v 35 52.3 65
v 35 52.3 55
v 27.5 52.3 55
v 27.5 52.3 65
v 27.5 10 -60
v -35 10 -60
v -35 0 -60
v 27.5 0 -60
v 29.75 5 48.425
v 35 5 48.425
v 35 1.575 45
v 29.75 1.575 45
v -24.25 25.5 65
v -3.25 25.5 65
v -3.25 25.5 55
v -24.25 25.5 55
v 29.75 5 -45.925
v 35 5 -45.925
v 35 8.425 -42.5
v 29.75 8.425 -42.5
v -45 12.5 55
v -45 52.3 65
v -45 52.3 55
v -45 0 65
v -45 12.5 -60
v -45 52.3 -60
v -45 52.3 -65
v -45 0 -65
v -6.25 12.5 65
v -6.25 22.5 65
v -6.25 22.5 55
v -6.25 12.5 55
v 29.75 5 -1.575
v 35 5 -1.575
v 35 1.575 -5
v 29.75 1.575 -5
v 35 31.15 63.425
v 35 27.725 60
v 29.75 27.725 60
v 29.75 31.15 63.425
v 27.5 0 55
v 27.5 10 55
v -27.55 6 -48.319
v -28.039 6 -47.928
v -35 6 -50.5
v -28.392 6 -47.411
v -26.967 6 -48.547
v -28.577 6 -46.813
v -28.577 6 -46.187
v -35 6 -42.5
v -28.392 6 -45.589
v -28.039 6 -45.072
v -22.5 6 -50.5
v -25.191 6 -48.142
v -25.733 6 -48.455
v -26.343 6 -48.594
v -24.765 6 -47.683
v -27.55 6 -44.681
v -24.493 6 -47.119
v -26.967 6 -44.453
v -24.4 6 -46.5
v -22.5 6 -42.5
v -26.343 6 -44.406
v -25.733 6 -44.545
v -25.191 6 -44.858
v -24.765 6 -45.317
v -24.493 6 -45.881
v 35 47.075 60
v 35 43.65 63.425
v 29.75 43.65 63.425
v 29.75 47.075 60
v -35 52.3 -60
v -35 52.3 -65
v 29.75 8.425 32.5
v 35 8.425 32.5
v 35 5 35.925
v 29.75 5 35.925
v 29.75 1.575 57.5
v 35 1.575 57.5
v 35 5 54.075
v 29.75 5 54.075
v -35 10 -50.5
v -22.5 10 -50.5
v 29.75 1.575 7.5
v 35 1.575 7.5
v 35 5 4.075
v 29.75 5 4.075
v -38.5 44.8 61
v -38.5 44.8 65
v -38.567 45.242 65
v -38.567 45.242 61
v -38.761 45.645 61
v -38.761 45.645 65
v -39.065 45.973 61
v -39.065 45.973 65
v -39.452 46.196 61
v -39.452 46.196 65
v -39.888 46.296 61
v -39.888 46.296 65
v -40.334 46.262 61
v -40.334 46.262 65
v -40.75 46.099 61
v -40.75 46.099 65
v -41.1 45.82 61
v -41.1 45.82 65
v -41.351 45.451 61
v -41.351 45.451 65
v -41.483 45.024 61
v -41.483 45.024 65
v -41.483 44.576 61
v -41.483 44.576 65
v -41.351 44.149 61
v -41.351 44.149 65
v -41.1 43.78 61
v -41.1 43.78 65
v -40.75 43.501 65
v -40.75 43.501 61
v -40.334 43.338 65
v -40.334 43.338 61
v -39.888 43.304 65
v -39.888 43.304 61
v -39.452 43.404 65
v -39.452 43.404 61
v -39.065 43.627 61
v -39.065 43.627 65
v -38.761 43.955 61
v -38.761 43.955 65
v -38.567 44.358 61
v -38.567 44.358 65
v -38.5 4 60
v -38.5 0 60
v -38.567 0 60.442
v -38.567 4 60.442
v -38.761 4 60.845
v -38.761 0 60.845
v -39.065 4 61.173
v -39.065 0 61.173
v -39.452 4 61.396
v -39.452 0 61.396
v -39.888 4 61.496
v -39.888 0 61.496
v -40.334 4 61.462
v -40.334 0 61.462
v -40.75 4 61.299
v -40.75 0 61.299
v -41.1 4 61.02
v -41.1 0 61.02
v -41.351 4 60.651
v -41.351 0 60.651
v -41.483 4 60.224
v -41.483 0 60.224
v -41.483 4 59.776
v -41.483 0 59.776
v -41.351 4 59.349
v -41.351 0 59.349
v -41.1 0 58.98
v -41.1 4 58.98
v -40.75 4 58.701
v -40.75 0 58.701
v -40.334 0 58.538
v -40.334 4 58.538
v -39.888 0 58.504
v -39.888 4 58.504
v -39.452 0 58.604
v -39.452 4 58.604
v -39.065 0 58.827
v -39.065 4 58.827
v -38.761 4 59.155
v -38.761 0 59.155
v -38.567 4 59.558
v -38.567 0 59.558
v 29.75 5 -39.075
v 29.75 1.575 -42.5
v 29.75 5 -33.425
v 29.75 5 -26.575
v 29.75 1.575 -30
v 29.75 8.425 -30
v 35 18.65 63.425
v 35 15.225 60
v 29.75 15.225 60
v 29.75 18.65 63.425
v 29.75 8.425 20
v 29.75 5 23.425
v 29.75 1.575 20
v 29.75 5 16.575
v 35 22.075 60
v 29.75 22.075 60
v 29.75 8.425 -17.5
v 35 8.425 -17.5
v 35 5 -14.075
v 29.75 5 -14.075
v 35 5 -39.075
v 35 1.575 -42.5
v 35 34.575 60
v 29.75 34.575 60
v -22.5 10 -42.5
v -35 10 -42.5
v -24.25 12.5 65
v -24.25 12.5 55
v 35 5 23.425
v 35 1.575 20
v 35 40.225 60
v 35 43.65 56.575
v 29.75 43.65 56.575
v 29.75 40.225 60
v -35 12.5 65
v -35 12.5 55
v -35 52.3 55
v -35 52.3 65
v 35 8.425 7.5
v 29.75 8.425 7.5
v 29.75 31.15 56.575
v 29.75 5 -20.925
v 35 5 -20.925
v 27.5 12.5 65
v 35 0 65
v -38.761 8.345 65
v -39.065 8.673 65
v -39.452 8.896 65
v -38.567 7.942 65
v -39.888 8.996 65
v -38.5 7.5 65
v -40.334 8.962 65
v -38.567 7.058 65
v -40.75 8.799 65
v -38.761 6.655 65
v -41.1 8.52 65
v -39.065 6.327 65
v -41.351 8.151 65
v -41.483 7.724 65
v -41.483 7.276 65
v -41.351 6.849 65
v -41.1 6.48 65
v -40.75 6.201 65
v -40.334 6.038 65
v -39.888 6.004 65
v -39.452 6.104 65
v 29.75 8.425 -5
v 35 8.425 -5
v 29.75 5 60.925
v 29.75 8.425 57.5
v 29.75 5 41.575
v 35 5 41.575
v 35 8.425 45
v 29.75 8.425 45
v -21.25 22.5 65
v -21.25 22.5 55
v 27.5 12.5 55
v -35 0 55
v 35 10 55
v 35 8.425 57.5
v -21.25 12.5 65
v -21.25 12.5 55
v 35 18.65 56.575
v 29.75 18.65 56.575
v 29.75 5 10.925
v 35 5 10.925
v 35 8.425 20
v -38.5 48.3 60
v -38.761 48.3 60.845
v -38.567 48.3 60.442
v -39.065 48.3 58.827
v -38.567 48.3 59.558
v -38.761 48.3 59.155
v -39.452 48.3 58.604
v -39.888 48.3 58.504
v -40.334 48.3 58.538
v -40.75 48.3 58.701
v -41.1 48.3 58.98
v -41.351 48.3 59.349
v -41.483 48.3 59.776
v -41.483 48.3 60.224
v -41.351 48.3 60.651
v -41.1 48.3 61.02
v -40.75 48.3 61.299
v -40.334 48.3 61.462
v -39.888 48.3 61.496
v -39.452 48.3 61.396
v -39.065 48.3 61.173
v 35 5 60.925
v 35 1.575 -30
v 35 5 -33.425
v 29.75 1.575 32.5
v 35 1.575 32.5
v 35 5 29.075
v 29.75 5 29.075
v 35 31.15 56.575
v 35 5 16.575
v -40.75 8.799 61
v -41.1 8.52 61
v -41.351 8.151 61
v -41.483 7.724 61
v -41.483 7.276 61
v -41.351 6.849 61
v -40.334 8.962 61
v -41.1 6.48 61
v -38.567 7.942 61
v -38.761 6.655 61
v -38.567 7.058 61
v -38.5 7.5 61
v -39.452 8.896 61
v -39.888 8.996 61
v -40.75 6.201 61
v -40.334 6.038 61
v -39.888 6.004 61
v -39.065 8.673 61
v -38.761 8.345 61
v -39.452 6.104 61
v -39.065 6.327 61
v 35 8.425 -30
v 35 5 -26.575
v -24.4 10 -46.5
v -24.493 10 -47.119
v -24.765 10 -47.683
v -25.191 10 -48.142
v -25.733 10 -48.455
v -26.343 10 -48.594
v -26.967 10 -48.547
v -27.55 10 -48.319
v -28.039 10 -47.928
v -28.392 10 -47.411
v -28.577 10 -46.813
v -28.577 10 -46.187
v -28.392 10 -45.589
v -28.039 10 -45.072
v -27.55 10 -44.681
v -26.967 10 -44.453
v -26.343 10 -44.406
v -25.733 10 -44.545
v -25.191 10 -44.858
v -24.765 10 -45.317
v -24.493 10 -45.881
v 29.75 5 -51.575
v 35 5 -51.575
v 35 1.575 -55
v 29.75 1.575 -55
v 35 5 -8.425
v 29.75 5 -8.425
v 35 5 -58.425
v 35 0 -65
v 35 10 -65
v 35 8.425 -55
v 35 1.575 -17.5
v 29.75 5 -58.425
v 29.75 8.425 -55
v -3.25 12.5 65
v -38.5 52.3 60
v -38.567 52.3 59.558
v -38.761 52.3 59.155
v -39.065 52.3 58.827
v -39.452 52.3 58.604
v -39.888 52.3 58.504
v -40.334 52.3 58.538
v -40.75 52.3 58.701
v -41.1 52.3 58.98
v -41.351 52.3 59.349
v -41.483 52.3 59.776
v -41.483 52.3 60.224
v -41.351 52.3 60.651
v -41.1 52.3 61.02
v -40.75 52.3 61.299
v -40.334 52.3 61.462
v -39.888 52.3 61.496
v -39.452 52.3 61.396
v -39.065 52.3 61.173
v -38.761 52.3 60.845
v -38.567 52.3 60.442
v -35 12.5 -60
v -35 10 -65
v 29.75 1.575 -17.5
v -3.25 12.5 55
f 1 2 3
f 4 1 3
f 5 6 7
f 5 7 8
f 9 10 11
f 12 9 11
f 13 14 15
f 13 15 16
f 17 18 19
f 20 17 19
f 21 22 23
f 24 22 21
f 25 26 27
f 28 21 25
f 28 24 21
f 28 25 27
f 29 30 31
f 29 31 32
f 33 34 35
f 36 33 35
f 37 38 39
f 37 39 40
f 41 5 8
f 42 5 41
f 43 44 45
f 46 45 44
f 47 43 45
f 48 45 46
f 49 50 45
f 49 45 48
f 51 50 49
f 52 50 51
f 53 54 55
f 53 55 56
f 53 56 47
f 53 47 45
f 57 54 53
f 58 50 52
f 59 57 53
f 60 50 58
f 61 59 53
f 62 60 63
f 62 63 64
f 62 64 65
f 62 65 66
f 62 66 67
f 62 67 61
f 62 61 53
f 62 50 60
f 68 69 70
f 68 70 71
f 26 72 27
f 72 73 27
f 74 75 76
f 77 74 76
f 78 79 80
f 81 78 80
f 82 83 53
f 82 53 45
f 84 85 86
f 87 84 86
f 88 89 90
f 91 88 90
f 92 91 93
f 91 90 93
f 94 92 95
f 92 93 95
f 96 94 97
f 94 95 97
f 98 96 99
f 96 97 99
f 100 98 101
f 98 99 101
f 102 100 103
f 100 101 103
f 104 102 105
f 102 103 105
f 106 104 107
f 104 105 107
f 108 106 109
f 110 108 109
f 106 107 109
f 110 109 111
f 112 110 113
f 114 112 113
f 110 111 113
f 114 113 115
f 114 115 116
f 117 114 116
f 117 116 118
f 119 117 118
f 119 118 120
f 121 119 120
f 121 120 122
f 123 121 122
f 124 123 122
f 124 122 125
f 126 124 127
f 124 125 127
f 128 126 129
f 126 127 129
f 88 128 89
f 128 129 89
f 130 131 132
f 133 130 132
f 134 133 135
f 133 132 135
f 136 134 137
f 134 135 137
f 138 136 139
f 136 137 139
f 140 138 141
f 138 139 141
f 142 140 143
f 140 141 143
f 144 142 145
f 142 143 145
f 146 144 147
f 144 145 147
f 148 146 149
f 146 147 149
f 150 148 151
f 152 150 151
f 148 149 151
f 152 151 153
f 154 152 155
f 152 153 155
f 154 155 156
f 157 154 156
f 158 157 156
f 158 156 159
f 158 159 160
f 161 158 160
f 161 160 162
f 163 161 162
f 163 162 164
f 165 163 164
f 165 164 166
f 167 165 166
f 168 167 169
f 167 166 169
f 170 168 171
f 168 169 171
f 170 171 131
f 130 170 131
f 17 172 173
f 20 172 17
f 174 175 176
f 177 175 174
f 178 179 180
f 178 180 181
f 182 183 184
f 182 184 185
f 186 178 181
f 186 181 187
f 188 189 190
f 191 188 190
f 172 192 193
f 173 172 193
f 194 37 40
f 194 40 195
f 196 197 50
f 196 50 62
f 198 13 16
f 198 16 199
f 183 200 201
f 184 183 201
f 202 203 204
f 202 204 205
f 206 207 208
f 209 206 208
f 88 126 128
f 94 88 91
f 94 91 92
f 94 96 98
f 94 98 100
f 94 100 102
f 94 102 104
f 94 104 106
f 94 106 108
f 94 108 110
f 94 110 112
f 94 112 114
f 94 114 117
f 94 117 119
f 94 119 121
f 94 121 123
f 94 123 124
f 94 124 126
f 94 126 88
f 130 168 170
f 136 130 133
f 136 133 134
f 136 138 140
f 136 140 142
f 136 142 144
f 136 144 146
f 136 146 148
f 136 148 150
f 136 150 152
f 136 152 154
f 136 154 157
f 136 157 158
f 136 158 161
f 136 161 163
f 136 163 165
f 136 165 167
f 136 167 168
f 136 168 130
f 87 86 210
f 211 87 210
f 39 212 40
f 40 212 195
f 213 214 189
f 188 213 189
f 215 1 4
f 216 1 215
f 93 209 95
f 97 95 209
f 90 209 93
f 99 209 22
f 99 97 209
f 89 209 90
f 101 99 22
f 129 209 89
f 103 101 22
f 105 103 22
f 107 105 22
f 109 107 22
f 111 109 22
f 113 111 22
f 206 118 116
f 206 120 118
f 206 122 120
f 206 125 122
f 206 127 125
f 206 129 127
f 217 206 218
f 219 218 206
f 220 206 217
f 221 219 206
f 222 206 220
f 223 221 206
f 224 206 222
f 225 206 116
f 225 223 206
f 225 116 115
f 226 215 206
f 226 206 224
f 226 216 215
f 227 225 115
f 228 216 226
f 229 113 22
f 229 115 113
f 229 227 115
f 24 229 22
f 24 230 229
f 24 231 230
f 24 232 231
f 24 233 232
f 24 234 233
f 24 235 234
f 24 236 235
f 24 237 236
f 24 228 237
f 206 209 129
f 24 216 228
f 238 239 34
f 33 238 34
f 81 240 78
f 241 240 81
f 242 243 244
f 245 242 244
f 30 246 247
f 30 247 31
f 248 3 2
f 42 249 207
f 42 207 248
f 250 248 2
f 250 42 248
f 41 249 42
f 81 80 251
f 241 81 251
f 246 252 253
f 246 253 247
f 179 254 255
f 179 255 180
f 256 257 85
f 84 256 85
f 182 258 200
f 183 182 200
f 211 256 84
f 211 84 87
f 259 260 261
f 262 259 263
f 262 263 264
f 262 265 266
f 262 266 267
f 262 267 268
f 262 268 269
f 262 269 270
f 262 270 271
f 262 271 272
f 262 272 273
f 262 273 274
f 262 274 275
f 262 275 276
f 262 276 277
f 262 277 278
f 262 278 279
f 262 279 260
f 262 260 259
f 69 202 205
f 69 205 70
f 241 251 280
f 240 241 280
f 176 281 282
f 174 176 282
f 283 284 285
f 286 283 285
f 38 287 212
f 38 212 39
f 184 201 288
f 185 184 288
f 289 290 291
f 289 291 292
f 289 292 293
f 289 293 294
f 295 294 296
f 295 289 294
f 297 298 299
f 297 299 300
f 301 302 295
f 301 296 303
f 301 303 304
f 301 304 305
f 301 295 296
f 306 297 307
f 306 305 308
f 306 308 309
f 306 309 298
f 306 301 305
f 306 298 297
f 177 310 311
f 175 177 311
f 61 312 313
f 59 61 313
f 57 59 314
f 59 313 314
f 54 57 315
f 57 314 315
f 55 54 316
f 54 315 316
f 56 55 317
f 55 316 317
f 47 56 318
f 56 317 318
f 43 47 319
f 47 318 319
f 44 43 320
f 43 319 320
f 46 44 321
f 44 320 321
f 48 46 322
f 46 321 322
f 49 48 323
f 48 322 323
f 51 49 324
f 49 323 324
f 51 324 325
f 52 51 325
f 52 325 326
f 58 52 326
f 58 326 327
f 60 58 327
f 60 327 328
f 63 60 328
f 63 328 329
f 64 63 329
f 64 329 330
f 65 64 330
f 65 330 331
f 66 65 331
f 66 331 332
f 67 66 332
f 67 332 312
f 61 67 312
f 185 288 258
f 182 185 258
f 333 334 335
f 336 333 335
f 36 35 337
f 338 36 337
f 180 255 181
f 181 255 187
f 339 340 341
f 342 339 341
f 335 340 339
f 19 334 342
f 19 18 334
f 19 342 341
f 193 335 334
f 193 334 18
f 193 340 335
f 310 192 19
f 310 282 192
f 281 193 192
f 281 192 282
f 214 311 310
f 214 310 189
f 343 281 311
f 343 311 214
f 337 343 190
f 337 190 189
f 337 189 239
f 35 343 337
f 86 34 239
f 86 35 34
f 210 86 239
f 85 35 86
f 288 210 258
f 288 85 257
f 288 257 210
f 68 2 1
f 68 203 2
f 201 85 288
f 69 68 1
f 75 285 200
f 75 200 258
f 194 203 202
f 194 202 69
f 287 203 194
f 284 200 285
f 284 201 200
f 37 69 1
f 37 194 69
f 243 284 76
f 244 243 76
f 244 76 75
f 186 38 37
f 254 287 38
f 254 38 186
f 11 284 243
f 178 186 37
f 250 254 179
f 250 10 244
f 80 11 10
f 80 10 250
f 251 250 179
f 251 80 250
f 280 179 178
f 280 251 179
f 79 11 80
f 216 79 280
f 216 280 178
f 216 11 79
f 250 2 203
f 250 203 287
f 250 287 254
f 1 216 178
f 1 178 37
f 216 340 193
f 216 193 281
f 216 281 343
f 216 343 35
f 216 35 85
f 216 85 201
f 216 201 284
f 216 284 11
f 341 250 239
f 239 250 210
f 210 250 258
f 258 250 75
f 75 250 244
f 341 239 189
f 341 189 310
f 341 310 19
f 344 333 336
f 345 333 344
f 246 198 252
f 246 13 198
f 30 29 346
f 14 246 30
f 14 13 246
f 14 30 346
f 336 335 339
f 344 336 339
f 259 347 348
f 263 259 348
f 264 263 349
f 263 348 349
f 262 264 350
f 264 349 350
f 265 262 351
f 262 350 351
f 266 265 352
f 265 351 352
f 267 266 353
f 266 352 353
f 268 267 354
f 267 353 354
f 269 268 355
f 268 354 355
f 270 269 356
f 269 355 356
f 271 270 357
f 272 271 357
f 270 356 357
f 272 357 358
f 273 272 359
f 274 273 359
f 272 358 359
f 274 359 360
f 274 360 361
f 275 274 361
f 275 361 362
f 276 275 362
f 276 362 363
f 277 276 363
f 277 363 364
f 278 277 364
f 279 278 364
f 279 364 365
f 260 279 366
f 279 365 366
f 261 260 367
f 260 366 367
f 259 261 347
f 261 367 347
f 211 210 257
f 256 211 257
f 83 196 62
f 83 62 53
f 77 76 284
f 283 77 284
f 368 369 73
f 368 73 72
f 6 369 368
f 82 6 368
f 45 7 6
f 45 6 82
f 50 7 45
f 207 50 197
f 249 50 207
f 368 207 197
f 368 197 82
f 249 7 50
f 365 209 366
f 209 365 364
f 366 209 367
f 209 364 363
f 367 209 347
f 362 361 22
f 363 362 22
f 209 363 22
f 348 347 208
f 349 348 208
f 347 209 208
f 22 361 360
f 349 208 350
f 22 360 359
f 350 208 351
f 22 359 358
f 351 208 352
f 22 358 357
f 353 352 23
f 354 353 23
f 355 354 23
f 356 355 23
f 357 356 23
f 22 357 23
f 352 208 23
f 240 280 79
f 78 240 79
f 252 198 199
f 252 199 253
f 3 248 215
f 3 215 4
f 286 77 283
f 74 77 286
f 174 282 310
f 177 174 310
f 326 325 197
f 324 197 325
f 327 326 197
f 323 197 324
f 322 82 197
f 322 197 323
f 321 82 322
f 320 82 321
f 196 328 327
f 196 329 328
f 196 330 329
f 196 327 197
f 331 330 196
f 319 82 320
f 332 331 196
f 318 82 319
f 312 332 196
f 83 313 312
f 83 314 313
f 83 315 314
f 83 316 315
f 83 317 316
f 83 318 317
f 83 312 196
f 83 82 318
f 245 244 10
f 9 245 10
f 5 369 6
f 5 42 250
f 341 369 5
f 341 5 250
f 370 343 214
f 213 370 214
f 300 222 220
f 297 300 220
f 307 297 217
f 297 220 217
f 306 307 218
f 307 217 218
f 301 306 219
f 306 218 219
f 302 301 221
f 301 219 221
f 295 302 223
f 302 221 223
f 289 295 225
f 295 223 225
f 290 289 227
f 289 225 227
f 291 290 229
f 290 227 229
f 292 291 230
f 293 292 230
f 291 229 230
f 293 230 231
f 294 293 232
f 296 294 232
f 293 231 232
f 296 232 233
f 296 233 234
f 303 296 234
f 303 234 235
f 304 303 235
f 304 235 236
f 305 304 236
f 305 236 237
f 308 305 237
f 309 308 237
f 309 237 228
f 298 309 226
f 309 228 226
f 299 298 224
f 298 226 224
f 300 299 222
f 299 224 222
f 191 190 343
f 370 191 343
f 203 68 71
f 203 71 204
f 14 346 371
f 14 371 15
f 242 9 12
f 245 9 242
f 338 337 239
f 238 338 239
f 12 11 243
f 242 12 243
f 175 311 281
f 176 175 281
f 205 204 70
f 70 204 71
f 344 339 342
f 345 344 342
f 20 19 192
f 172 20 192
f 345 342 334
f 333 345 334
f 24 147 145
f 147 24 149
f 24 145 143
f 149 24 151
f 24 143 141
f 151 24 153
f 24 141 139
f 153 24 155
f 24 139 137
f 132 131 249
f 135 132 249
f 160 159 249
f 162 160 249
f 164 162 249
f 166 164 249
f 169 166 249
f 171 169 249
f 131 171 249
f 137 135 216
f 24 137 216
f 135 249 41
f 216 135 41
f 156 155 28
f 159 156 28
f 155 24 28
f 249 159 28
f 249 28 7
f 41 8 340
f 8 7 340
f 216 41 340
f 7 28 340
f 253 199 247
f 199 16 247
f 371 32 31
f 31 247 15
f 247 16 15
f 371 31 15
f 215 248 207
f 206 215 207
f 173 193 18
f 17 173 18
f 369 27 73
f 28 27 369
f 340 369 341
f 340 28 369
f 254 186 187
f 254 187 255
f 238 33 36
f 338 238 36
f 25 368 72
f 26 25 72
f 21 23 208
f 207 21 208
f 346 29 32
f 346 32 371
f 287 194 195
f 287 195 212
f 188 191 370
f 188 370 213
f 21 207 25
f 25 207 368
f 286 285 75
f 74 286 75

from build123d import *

# Parameters (mm, degrees)
SKETCH1_W           = 80
SKETCH1_H           = 130
BOSS_EXTRUDE1_DEPTH = 10
BOSS_EXTRUDE2_DEPTH = 42.3
CUT_EXTRUDE1_DEPTH  = 5.25
SKETCH4_R           = 2.1
CUT_EXTRUDE2_DEPTH  = 11
CUT_EXTRUDE3_DEPTH  = 11
SKETCH7_W           = 115
SKETCH7_H           = 39.8
CUT_EXTRUDE4_DEPTH  = 11
SKETCH8_W           = 62.5
SKETCH8_H           = 39.8
CUT_EXTRUDE5_DEPTH  = 10
SKETCH9_R           = 1.5
CUT_EXTRUDE6_DEPTH  = 4
SKETCH10_R          = 1.5
CUT_EXTRUDE7_DEPTH  = 4
SKETCH11_W          = 12.5
SKETCH11_H          = 8
CUT_EXTRUDE8_DEPTH  = 6
BOSS_EXTRUDE3_DEPTH = 10
SKETCH14_R          = 1.5
CUT_EXTRUDE9_DEPTH  = 4


with BuildPart() as part:
    # Sketch1 → Boss-Extrude1 (new body)
    with BuildSketch(Plane(origin=(0, 0, 0), x_dir=(1, 0, 0), z_dir=(0, 1, 0))):
        with Locations((-5, 0)):
            Rectangle(SKETCH1_W, SKETCH1_H)
    extrude(amount=BOSS_EXTRUDE1_DEPTH)

    # Sketch2 → Boss-Extrude2 (add)
    with BuildSketch(Plane(origin=(0, 10, 0), x_dir=(1, 0, 0), z_dir=(0, 1, 0))):
        Polygon((35, -65), (-45, -65), (-45, 65), (-35, 65), (-35, -55), (35, -55), align=None)
    extrude(amount=BOSS_EXTRUDE2_DEPTH)

    # Sketch3 → Cut-Extrude1 (cut)
    with BuildSketch(Plane(origin=(35, 0, 0), x_dir=(0, 0, -1), z_dir=(1, 0, 0))):
        Polygon((20.925, 5), (17.5, 8.425), (14.075, 5), (17.5, 1.575), align=None)
        Polygon((33.425, 5), (30, 8.425), (26.575, 5), (30, 1.575), align=None)
        Polygon((5, 8.425), (1.575, 5), (5, 1.575), (8.425, 5), align=None)
        Polygon((-4.075, 5), (-7.5, 8.425), (-10.925, 5), (-7.5, 1.575), align=None)
        Polygon((-16.575, 5), (-20, 8.425), (-23.425, 5), (-20, 1.575), align=None)
        Polygon((-29.075, 5), (-32.5, 8.425), (-35.925, 5), (-32.5, 1.575), align=None)
        Polygon((-41.575, 5), (-45, 8.425), (-48.425, 5), (-45, 1.575), align=None)
        Polygon((-54.075, 5), (-57.5, 8.425), (-60.925, 5), (-57.5, 1.575), align=None)
        Polygon((-63.425, 31.15), (-60, 34.575), (-56.575, 31.15), (-60, 27.725), align=None)
        Polygon((-60, 40.225), (-63.425, 43.65), (-60, 47.075), (-56.575, 43.65), align=None)
        Polygon((-60, 15.225), (-63.425, 18.65), (-60, 22.075), (-56.575, 18.65), align=None)
        Polygon((45.925, 5), (42.5, 8.425), (39.075, 5), (42.5, 1.575), align=None)
        Polygon((58.425, 5), (55, 8.425), (51.575, 5), (55, 1.575), align=None)
    extrude(amount=-CUT_EXTRUDE1_DEPTH, mode=Mode.SUBTRACT)

    # Sketch4 → Cut-Extrude2 (cut, through all)
    with BuildSketch(Plane(origin=(0, 10, 0), x_dir=(1, 0, 0), z_dir=(0, 1, 0))):
        with Locations((-26.5, 46.5)):
            Circle(SKETCH4_R)
    extrude(amount=-CUT_EXTRUDE2_DEPTH, mode=Mode.SUBTRACT)

    # Sketch5 → Cut-Extrude3 (cut, through all)
    with BuildSketch(Plane(origin=(0, 10, 0), x_dir=(1, 0, 0), z_dir=(0, 1, 0))):
        Polygon((-35, -55), (-35, 42.5), (-22.5, 42.5), (-22.5, 50.5), (-35, 50.5), (-35, 60), (27.5, 60), (27.5, -55), align=None)
    extrude(amount=-CUT_EXTRUDE3_DEPTH, mode=Mode.SUBTRACT)

    # Sketch7 → Cut-Extrude4 (cut, through all)
    with BuildSketch(Plane(origin=(-35, 0, 0), x_dir=(0, 0, -1), z_dir=(1, 0, 0))):
        with Locations((2.5, 32.4)):
            Rectangle(SKETCH7_W, SKETCH7_H)
    extrude(amount=-CUT_EXTRUDE4_DEPTH, mode=Mode.SUBTRACT)

    # Sketch8 → Cut-Extrude5 (cut)
    with BuildSketch(Plane(origin=(0, 0, 55), x_dir=(-1, 0, 0), z_dir=(0, 0, -1))):
        with Locations((3.75, 32.4)):
            Rectangle(SKETCH8_W, SKETCH8_H)
    extrude(amount=-CUT_EXTRUDE5_DEPTH, mode=Mode.SUBTRACT)

    # Sketch9 → Cut-Extrude6 (cut)
    with BuildSketch(Plane(origin=(0, 52.3, 0), x_dir=(1, 0, 0), z_dir=(0, 1, 0))):
        with Locations((-40, -60)):
            Circle(SKETCH9_R)
    extrude(amount=-CUT_EXTRUDE6_DEPTH, mode=Mode.SUBTRACT)

    # Sketch10 → Cut-Extrude7 (cut)
    with BuildSketch(Plane.XZ):
        with Locations((-40, 60)):
            Circle(SKETCH10_R)
    extrude(amount=-CUT_EXTRUDE7_DEPTH, mode=Mode.SUBTRACT)

    # Sketch11 → Cut-Extrude8 (cut)
    with BuildSketch(Plane.XZ):
        with Locations((-28.75, -46.5)):
            Rectangle(SKETCH11_W, SKETCH11_H)
    extrude(amount=-CUT_EXTRUDE8_DEPTH, mode=Mode.SUBTRACT)

    # Sketch14 → Cut-Extrude9 (cut)
    with BuildSketch(Plane.XY.offset(65)):
        with Locations((-40, 44.8)):
            Circle(SKETCH14_R)
        with Locations((-40, 7.5)):
            Circle(SKETCH14_R)
    extrude(amount=-CUT_EXTRUDE9_DEPTH, mode=Mode.SUBTRACT)


with BuildPart() as body_2:
    # Sketch13 → Boss-Extrude3 (new body)
    with BuildSketch(Plane.XY.offset(65)):
        Polygon((-24.25, 12.5), (-21.25, 12.5), (-21.25, 22.5), (-6.25, 22.5), (-6.25, 12.5), (-3.25, 12.5), (-3.25, 25.5), (-24.25, 25.5), align=None)
    extrude(amount=-BOSS_EXTRUDE3_DEPTH)


solid = Compound([part.part, body_2.part])
